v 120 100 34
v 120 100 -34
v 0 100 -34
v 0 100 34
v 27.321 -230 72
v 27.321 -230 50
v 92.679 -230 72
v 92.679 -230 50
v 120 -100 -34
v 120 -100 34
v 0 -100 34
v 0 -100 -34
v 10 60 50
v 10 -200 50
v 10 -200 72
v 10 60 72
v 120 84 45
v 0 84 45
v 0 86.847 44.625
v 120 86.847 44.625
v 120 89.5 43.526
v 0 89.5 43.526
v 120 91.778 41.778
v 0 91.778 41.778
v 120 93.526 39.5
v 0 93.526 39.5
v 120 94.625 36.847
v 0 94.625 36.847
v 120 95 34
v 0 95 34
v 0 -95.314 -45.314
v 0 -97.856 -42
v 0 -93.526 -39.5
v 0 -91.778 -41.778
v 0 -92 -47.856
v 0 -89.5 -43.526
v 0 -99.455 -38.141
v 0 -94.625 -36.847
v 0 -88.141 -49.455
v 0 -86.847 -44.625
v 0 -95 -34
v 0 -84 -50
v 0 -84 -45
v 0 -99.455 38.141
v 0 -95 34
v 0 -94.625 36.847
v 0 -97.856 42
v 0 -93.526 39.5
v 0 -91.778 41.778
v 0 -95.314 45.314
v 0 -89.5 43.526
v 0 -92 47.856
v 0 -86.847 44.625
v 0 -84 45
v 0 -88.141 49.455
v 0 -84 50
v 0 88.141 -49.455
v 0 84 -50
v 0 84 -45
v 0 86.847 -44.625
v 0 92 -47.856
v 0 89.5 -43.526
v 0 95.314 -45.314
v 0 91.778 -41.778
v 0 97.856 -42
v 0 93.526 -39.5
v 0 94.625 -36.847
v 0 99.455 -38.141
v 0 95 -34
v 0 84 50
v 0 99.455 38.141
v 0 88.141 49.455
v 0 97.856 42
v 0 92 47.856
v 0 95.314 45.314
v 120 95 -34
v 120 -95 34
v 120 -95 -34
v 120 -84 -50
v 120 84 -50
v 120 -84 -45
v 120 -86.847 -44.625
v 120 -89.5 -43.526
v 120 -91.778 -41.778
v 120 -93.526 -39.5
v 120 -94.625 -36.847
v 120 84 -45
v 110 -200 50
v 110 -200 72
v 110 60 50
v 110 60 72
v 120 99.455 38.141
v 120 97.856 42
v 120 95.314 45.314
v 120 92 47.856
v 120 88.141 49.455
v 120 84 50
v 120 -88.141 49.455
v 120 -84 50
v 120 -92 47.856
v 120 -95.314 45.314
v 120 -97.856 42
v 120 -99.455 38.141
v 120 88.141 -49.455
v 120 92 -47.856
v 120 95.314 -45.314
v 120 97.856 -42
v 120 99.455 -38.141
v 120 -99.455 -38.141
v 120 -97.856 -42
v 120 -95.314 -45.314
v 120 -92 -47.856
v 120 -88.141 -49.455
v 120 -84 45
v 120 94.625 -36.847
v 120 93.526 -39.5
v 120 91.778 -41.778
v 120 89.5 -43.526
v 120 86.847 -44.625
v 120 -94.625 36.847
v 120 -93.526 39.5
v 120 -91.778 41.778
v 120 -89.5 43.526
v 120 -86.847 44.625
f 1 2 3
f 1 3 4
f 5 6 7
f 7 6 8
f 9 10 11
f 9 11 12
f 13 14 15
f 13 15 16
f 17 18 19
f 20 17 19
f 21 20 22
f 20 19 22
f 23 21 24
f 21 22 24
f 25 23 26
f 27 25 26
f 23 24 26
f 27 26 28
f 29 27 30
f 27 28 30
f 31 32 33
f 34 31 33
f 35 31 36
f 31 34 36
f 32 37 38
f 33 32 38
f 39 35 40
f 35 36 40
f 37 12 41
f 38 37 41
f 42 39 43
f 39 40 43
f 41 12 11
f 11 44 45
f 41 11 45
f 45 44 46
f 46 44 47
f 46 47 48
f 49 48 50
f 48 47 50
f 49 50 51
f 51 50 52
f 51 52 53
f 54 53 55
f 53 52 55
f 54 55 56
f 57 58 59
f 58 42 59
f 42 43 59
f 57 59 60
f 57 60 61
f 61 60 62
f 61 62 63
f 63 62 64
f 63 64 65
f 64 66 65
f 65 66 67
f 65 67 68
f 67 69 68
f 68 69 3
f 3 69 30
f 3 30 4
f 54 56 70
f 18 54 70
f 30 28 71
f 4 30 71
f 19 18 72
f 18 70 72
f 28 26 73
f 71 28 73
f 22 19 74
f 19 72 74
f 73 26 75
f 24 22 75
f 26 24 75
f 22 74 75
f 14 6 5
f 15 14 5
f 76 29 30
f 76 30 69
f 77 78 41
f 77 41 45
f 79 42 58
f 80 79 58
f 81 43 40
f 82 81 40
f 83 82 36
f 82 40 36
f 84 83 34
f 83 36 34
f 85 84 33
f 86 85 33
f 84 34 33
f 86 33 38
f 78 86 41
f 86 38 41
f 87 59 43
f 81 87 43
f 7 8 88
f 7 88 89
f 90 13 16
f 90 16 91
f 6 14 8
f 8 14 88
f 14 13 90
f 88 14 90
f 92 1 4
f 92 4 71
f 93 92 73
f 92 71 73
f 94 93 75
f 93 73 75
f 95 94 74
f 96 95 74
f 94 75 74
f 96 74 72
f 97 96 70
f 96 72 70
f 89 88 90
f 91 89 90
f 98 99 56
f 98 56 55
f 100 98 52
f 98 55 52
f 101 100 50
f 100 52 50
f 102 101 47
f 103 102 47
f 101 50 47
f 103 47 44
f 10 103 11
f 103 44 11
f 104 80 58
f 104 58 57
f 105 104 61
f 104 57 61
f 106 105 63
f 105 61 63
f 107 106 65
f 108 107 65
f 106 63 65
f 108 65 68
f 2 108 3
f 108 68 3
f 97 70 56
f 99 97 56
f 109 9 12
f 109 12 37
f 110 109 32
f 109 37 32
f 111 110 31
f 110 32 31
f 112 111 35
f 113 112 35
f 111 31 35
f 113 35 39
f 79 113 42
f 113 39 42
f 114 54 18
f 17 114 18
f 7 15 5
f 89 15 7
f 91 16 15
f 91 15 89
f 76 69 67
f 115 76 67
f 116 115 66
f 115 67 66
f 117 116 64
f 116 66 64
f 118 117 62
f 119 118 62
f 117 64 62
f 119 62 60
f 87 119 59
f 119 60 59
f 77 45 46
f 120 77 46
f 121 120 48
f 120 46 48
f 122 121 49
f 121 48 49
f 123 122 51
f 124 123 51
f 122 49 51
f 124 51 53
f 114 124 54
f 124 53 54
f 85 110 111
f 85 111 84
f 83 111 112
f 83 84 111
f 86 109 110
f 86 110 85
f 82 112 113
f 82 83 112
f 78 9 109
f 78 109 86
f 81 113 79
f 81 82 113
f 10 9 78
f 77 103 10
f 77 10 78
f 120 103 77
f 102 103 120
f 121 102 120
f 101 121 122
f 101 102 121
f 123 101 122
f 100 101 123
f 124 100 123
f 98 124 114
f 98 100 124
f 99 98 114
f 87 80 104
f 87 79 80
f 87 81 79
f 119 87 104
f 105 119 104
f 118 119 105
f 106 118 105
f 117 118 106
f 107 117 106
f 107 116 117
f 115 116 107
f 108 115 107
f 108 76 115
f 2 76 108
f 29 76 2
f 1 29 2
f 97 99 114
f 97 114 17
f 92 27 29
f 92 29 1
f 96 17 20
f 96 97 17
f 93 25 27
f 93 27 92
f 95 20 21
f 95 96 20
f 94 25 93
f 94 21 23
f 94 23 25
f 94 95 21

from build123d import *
from OCP.BRepFilletAPI import BRepFilletAPI_MakeChamfer

# Parameters (mm, degrees)
MEMBRO_STRUTTURALE1_DEPTH = 120
SCHIZZO3_W                = 100
SCHIZZO3_H                = 290
ESTRUSIONE1_DEPTH         = 22
SMUSSO1_SIZE              = 30
SMUSSO1_SIZE2             = 17.320508076


# Read off the part's stored shape, not the designer's step: Membro strutturale1
with BuildPart() as part:
    # Membro strutturale1 outline → Membro strutturale1 (new body)
    with BuildSketch(Plane.YZ):
        with BuildLine():
            ThreePointArc((84, -50), (95.313708499, -45.313708499), (100, -34))
            Line((100, -34), (100, 34))
            ThreePointArc((100, 34), (95.313708499, 45.313708499), (84, 50))
            Line((84, 50), (-84, 50))
            ThreePointArc((-84, 50), (-95.313708499, 45.313708499), (-100, 34))
            Line((-100, 34), (-100, -34))
            ThreePointArc((-100, -34), (-95.313708499, -45.313708499), (-84, -50))
            Line((-84, -50), (84, -50))
        make_face()
        with BuildLine():
            Line((-84, 45), (84, 45))
            ThreePointArc((84, 45), (91.778174593, 41.778174593), (95, 34))
            Line((95, 34), (95, -34))
            ThreePointArc((95, -34), (91.778174593, -41.778174593), (84, -45))
            Line((84, -45), (-84, -45))
            ThreePointArc((-84, -45), (-91.778174593, -41.778174593), (-95, -34))
            Line((-95, -34), (-95, 34))
            ThreePointArc((-95, 34), (-91.778174593, 41.778174593), (-84, 45))
        make_face(mode=Mode.SUBTRACT)
    extrude(amount=MEMBRO_STRUTTURALE1_DEPTH)


with BuildPart() as body_2:
    # Schizzo3 → Estrusione1 (new body)
    with BuildSketch(Plane.XY.offset(50)):
        with Locations((60, -85)):
            Rectangle(SCHIZZO3_W, SCHIZZO3_H)
    extrude(amount=ESTRUSIONE1_DEPTH)

    # Smusso1: one chamfer whose edges measure the first distance from different faces: ONE call of the kernel's chamfer builder (chamfer() names one face for all edges)
    smusso1_edges_1 = [body_2.edges().sort_by_distance(p)[0] for p in [
        (110, -230, 61),
    ]]
    smusso1_side_1 = [body_2.faces().sort_by_distance(p)[0] for p in [
        (110, -85, 61),
    ]]
    smusso1_edges_2 = [body_2.edges().sort_by_distance(p)[0] for p in [
        (10, -230, 61),
    ]]
    smusso1_side_2 = [body_2.faces().sort_by_distance(p)[0] for p in [
        (10, -85, 61),
    ]]
    smusso1 = BRepFilletAPI_MakeChamfer(body_2.part.solid().wrapped)
    for e in smusso1_edges_1:
        smusso1.Add(SMUSSO1_SIZE, SMUSSO1_SIZE2, e.wrapped, smusso1_side_1[0].wrapped)  # the first distance lies on this face
    for e in smusso1_edges_2:
        smusso1.Add(SMUSSO1_SIZE, SMUSSO1_SIZE2, e.wrapped, smusso1_side_2[0].wrapped)  # the first distance lies on this face
    add(Compound.cast(smusso1.Shape()), mode=Mode.REPLACE)


solid = Compound([part.part, body_2.part])
